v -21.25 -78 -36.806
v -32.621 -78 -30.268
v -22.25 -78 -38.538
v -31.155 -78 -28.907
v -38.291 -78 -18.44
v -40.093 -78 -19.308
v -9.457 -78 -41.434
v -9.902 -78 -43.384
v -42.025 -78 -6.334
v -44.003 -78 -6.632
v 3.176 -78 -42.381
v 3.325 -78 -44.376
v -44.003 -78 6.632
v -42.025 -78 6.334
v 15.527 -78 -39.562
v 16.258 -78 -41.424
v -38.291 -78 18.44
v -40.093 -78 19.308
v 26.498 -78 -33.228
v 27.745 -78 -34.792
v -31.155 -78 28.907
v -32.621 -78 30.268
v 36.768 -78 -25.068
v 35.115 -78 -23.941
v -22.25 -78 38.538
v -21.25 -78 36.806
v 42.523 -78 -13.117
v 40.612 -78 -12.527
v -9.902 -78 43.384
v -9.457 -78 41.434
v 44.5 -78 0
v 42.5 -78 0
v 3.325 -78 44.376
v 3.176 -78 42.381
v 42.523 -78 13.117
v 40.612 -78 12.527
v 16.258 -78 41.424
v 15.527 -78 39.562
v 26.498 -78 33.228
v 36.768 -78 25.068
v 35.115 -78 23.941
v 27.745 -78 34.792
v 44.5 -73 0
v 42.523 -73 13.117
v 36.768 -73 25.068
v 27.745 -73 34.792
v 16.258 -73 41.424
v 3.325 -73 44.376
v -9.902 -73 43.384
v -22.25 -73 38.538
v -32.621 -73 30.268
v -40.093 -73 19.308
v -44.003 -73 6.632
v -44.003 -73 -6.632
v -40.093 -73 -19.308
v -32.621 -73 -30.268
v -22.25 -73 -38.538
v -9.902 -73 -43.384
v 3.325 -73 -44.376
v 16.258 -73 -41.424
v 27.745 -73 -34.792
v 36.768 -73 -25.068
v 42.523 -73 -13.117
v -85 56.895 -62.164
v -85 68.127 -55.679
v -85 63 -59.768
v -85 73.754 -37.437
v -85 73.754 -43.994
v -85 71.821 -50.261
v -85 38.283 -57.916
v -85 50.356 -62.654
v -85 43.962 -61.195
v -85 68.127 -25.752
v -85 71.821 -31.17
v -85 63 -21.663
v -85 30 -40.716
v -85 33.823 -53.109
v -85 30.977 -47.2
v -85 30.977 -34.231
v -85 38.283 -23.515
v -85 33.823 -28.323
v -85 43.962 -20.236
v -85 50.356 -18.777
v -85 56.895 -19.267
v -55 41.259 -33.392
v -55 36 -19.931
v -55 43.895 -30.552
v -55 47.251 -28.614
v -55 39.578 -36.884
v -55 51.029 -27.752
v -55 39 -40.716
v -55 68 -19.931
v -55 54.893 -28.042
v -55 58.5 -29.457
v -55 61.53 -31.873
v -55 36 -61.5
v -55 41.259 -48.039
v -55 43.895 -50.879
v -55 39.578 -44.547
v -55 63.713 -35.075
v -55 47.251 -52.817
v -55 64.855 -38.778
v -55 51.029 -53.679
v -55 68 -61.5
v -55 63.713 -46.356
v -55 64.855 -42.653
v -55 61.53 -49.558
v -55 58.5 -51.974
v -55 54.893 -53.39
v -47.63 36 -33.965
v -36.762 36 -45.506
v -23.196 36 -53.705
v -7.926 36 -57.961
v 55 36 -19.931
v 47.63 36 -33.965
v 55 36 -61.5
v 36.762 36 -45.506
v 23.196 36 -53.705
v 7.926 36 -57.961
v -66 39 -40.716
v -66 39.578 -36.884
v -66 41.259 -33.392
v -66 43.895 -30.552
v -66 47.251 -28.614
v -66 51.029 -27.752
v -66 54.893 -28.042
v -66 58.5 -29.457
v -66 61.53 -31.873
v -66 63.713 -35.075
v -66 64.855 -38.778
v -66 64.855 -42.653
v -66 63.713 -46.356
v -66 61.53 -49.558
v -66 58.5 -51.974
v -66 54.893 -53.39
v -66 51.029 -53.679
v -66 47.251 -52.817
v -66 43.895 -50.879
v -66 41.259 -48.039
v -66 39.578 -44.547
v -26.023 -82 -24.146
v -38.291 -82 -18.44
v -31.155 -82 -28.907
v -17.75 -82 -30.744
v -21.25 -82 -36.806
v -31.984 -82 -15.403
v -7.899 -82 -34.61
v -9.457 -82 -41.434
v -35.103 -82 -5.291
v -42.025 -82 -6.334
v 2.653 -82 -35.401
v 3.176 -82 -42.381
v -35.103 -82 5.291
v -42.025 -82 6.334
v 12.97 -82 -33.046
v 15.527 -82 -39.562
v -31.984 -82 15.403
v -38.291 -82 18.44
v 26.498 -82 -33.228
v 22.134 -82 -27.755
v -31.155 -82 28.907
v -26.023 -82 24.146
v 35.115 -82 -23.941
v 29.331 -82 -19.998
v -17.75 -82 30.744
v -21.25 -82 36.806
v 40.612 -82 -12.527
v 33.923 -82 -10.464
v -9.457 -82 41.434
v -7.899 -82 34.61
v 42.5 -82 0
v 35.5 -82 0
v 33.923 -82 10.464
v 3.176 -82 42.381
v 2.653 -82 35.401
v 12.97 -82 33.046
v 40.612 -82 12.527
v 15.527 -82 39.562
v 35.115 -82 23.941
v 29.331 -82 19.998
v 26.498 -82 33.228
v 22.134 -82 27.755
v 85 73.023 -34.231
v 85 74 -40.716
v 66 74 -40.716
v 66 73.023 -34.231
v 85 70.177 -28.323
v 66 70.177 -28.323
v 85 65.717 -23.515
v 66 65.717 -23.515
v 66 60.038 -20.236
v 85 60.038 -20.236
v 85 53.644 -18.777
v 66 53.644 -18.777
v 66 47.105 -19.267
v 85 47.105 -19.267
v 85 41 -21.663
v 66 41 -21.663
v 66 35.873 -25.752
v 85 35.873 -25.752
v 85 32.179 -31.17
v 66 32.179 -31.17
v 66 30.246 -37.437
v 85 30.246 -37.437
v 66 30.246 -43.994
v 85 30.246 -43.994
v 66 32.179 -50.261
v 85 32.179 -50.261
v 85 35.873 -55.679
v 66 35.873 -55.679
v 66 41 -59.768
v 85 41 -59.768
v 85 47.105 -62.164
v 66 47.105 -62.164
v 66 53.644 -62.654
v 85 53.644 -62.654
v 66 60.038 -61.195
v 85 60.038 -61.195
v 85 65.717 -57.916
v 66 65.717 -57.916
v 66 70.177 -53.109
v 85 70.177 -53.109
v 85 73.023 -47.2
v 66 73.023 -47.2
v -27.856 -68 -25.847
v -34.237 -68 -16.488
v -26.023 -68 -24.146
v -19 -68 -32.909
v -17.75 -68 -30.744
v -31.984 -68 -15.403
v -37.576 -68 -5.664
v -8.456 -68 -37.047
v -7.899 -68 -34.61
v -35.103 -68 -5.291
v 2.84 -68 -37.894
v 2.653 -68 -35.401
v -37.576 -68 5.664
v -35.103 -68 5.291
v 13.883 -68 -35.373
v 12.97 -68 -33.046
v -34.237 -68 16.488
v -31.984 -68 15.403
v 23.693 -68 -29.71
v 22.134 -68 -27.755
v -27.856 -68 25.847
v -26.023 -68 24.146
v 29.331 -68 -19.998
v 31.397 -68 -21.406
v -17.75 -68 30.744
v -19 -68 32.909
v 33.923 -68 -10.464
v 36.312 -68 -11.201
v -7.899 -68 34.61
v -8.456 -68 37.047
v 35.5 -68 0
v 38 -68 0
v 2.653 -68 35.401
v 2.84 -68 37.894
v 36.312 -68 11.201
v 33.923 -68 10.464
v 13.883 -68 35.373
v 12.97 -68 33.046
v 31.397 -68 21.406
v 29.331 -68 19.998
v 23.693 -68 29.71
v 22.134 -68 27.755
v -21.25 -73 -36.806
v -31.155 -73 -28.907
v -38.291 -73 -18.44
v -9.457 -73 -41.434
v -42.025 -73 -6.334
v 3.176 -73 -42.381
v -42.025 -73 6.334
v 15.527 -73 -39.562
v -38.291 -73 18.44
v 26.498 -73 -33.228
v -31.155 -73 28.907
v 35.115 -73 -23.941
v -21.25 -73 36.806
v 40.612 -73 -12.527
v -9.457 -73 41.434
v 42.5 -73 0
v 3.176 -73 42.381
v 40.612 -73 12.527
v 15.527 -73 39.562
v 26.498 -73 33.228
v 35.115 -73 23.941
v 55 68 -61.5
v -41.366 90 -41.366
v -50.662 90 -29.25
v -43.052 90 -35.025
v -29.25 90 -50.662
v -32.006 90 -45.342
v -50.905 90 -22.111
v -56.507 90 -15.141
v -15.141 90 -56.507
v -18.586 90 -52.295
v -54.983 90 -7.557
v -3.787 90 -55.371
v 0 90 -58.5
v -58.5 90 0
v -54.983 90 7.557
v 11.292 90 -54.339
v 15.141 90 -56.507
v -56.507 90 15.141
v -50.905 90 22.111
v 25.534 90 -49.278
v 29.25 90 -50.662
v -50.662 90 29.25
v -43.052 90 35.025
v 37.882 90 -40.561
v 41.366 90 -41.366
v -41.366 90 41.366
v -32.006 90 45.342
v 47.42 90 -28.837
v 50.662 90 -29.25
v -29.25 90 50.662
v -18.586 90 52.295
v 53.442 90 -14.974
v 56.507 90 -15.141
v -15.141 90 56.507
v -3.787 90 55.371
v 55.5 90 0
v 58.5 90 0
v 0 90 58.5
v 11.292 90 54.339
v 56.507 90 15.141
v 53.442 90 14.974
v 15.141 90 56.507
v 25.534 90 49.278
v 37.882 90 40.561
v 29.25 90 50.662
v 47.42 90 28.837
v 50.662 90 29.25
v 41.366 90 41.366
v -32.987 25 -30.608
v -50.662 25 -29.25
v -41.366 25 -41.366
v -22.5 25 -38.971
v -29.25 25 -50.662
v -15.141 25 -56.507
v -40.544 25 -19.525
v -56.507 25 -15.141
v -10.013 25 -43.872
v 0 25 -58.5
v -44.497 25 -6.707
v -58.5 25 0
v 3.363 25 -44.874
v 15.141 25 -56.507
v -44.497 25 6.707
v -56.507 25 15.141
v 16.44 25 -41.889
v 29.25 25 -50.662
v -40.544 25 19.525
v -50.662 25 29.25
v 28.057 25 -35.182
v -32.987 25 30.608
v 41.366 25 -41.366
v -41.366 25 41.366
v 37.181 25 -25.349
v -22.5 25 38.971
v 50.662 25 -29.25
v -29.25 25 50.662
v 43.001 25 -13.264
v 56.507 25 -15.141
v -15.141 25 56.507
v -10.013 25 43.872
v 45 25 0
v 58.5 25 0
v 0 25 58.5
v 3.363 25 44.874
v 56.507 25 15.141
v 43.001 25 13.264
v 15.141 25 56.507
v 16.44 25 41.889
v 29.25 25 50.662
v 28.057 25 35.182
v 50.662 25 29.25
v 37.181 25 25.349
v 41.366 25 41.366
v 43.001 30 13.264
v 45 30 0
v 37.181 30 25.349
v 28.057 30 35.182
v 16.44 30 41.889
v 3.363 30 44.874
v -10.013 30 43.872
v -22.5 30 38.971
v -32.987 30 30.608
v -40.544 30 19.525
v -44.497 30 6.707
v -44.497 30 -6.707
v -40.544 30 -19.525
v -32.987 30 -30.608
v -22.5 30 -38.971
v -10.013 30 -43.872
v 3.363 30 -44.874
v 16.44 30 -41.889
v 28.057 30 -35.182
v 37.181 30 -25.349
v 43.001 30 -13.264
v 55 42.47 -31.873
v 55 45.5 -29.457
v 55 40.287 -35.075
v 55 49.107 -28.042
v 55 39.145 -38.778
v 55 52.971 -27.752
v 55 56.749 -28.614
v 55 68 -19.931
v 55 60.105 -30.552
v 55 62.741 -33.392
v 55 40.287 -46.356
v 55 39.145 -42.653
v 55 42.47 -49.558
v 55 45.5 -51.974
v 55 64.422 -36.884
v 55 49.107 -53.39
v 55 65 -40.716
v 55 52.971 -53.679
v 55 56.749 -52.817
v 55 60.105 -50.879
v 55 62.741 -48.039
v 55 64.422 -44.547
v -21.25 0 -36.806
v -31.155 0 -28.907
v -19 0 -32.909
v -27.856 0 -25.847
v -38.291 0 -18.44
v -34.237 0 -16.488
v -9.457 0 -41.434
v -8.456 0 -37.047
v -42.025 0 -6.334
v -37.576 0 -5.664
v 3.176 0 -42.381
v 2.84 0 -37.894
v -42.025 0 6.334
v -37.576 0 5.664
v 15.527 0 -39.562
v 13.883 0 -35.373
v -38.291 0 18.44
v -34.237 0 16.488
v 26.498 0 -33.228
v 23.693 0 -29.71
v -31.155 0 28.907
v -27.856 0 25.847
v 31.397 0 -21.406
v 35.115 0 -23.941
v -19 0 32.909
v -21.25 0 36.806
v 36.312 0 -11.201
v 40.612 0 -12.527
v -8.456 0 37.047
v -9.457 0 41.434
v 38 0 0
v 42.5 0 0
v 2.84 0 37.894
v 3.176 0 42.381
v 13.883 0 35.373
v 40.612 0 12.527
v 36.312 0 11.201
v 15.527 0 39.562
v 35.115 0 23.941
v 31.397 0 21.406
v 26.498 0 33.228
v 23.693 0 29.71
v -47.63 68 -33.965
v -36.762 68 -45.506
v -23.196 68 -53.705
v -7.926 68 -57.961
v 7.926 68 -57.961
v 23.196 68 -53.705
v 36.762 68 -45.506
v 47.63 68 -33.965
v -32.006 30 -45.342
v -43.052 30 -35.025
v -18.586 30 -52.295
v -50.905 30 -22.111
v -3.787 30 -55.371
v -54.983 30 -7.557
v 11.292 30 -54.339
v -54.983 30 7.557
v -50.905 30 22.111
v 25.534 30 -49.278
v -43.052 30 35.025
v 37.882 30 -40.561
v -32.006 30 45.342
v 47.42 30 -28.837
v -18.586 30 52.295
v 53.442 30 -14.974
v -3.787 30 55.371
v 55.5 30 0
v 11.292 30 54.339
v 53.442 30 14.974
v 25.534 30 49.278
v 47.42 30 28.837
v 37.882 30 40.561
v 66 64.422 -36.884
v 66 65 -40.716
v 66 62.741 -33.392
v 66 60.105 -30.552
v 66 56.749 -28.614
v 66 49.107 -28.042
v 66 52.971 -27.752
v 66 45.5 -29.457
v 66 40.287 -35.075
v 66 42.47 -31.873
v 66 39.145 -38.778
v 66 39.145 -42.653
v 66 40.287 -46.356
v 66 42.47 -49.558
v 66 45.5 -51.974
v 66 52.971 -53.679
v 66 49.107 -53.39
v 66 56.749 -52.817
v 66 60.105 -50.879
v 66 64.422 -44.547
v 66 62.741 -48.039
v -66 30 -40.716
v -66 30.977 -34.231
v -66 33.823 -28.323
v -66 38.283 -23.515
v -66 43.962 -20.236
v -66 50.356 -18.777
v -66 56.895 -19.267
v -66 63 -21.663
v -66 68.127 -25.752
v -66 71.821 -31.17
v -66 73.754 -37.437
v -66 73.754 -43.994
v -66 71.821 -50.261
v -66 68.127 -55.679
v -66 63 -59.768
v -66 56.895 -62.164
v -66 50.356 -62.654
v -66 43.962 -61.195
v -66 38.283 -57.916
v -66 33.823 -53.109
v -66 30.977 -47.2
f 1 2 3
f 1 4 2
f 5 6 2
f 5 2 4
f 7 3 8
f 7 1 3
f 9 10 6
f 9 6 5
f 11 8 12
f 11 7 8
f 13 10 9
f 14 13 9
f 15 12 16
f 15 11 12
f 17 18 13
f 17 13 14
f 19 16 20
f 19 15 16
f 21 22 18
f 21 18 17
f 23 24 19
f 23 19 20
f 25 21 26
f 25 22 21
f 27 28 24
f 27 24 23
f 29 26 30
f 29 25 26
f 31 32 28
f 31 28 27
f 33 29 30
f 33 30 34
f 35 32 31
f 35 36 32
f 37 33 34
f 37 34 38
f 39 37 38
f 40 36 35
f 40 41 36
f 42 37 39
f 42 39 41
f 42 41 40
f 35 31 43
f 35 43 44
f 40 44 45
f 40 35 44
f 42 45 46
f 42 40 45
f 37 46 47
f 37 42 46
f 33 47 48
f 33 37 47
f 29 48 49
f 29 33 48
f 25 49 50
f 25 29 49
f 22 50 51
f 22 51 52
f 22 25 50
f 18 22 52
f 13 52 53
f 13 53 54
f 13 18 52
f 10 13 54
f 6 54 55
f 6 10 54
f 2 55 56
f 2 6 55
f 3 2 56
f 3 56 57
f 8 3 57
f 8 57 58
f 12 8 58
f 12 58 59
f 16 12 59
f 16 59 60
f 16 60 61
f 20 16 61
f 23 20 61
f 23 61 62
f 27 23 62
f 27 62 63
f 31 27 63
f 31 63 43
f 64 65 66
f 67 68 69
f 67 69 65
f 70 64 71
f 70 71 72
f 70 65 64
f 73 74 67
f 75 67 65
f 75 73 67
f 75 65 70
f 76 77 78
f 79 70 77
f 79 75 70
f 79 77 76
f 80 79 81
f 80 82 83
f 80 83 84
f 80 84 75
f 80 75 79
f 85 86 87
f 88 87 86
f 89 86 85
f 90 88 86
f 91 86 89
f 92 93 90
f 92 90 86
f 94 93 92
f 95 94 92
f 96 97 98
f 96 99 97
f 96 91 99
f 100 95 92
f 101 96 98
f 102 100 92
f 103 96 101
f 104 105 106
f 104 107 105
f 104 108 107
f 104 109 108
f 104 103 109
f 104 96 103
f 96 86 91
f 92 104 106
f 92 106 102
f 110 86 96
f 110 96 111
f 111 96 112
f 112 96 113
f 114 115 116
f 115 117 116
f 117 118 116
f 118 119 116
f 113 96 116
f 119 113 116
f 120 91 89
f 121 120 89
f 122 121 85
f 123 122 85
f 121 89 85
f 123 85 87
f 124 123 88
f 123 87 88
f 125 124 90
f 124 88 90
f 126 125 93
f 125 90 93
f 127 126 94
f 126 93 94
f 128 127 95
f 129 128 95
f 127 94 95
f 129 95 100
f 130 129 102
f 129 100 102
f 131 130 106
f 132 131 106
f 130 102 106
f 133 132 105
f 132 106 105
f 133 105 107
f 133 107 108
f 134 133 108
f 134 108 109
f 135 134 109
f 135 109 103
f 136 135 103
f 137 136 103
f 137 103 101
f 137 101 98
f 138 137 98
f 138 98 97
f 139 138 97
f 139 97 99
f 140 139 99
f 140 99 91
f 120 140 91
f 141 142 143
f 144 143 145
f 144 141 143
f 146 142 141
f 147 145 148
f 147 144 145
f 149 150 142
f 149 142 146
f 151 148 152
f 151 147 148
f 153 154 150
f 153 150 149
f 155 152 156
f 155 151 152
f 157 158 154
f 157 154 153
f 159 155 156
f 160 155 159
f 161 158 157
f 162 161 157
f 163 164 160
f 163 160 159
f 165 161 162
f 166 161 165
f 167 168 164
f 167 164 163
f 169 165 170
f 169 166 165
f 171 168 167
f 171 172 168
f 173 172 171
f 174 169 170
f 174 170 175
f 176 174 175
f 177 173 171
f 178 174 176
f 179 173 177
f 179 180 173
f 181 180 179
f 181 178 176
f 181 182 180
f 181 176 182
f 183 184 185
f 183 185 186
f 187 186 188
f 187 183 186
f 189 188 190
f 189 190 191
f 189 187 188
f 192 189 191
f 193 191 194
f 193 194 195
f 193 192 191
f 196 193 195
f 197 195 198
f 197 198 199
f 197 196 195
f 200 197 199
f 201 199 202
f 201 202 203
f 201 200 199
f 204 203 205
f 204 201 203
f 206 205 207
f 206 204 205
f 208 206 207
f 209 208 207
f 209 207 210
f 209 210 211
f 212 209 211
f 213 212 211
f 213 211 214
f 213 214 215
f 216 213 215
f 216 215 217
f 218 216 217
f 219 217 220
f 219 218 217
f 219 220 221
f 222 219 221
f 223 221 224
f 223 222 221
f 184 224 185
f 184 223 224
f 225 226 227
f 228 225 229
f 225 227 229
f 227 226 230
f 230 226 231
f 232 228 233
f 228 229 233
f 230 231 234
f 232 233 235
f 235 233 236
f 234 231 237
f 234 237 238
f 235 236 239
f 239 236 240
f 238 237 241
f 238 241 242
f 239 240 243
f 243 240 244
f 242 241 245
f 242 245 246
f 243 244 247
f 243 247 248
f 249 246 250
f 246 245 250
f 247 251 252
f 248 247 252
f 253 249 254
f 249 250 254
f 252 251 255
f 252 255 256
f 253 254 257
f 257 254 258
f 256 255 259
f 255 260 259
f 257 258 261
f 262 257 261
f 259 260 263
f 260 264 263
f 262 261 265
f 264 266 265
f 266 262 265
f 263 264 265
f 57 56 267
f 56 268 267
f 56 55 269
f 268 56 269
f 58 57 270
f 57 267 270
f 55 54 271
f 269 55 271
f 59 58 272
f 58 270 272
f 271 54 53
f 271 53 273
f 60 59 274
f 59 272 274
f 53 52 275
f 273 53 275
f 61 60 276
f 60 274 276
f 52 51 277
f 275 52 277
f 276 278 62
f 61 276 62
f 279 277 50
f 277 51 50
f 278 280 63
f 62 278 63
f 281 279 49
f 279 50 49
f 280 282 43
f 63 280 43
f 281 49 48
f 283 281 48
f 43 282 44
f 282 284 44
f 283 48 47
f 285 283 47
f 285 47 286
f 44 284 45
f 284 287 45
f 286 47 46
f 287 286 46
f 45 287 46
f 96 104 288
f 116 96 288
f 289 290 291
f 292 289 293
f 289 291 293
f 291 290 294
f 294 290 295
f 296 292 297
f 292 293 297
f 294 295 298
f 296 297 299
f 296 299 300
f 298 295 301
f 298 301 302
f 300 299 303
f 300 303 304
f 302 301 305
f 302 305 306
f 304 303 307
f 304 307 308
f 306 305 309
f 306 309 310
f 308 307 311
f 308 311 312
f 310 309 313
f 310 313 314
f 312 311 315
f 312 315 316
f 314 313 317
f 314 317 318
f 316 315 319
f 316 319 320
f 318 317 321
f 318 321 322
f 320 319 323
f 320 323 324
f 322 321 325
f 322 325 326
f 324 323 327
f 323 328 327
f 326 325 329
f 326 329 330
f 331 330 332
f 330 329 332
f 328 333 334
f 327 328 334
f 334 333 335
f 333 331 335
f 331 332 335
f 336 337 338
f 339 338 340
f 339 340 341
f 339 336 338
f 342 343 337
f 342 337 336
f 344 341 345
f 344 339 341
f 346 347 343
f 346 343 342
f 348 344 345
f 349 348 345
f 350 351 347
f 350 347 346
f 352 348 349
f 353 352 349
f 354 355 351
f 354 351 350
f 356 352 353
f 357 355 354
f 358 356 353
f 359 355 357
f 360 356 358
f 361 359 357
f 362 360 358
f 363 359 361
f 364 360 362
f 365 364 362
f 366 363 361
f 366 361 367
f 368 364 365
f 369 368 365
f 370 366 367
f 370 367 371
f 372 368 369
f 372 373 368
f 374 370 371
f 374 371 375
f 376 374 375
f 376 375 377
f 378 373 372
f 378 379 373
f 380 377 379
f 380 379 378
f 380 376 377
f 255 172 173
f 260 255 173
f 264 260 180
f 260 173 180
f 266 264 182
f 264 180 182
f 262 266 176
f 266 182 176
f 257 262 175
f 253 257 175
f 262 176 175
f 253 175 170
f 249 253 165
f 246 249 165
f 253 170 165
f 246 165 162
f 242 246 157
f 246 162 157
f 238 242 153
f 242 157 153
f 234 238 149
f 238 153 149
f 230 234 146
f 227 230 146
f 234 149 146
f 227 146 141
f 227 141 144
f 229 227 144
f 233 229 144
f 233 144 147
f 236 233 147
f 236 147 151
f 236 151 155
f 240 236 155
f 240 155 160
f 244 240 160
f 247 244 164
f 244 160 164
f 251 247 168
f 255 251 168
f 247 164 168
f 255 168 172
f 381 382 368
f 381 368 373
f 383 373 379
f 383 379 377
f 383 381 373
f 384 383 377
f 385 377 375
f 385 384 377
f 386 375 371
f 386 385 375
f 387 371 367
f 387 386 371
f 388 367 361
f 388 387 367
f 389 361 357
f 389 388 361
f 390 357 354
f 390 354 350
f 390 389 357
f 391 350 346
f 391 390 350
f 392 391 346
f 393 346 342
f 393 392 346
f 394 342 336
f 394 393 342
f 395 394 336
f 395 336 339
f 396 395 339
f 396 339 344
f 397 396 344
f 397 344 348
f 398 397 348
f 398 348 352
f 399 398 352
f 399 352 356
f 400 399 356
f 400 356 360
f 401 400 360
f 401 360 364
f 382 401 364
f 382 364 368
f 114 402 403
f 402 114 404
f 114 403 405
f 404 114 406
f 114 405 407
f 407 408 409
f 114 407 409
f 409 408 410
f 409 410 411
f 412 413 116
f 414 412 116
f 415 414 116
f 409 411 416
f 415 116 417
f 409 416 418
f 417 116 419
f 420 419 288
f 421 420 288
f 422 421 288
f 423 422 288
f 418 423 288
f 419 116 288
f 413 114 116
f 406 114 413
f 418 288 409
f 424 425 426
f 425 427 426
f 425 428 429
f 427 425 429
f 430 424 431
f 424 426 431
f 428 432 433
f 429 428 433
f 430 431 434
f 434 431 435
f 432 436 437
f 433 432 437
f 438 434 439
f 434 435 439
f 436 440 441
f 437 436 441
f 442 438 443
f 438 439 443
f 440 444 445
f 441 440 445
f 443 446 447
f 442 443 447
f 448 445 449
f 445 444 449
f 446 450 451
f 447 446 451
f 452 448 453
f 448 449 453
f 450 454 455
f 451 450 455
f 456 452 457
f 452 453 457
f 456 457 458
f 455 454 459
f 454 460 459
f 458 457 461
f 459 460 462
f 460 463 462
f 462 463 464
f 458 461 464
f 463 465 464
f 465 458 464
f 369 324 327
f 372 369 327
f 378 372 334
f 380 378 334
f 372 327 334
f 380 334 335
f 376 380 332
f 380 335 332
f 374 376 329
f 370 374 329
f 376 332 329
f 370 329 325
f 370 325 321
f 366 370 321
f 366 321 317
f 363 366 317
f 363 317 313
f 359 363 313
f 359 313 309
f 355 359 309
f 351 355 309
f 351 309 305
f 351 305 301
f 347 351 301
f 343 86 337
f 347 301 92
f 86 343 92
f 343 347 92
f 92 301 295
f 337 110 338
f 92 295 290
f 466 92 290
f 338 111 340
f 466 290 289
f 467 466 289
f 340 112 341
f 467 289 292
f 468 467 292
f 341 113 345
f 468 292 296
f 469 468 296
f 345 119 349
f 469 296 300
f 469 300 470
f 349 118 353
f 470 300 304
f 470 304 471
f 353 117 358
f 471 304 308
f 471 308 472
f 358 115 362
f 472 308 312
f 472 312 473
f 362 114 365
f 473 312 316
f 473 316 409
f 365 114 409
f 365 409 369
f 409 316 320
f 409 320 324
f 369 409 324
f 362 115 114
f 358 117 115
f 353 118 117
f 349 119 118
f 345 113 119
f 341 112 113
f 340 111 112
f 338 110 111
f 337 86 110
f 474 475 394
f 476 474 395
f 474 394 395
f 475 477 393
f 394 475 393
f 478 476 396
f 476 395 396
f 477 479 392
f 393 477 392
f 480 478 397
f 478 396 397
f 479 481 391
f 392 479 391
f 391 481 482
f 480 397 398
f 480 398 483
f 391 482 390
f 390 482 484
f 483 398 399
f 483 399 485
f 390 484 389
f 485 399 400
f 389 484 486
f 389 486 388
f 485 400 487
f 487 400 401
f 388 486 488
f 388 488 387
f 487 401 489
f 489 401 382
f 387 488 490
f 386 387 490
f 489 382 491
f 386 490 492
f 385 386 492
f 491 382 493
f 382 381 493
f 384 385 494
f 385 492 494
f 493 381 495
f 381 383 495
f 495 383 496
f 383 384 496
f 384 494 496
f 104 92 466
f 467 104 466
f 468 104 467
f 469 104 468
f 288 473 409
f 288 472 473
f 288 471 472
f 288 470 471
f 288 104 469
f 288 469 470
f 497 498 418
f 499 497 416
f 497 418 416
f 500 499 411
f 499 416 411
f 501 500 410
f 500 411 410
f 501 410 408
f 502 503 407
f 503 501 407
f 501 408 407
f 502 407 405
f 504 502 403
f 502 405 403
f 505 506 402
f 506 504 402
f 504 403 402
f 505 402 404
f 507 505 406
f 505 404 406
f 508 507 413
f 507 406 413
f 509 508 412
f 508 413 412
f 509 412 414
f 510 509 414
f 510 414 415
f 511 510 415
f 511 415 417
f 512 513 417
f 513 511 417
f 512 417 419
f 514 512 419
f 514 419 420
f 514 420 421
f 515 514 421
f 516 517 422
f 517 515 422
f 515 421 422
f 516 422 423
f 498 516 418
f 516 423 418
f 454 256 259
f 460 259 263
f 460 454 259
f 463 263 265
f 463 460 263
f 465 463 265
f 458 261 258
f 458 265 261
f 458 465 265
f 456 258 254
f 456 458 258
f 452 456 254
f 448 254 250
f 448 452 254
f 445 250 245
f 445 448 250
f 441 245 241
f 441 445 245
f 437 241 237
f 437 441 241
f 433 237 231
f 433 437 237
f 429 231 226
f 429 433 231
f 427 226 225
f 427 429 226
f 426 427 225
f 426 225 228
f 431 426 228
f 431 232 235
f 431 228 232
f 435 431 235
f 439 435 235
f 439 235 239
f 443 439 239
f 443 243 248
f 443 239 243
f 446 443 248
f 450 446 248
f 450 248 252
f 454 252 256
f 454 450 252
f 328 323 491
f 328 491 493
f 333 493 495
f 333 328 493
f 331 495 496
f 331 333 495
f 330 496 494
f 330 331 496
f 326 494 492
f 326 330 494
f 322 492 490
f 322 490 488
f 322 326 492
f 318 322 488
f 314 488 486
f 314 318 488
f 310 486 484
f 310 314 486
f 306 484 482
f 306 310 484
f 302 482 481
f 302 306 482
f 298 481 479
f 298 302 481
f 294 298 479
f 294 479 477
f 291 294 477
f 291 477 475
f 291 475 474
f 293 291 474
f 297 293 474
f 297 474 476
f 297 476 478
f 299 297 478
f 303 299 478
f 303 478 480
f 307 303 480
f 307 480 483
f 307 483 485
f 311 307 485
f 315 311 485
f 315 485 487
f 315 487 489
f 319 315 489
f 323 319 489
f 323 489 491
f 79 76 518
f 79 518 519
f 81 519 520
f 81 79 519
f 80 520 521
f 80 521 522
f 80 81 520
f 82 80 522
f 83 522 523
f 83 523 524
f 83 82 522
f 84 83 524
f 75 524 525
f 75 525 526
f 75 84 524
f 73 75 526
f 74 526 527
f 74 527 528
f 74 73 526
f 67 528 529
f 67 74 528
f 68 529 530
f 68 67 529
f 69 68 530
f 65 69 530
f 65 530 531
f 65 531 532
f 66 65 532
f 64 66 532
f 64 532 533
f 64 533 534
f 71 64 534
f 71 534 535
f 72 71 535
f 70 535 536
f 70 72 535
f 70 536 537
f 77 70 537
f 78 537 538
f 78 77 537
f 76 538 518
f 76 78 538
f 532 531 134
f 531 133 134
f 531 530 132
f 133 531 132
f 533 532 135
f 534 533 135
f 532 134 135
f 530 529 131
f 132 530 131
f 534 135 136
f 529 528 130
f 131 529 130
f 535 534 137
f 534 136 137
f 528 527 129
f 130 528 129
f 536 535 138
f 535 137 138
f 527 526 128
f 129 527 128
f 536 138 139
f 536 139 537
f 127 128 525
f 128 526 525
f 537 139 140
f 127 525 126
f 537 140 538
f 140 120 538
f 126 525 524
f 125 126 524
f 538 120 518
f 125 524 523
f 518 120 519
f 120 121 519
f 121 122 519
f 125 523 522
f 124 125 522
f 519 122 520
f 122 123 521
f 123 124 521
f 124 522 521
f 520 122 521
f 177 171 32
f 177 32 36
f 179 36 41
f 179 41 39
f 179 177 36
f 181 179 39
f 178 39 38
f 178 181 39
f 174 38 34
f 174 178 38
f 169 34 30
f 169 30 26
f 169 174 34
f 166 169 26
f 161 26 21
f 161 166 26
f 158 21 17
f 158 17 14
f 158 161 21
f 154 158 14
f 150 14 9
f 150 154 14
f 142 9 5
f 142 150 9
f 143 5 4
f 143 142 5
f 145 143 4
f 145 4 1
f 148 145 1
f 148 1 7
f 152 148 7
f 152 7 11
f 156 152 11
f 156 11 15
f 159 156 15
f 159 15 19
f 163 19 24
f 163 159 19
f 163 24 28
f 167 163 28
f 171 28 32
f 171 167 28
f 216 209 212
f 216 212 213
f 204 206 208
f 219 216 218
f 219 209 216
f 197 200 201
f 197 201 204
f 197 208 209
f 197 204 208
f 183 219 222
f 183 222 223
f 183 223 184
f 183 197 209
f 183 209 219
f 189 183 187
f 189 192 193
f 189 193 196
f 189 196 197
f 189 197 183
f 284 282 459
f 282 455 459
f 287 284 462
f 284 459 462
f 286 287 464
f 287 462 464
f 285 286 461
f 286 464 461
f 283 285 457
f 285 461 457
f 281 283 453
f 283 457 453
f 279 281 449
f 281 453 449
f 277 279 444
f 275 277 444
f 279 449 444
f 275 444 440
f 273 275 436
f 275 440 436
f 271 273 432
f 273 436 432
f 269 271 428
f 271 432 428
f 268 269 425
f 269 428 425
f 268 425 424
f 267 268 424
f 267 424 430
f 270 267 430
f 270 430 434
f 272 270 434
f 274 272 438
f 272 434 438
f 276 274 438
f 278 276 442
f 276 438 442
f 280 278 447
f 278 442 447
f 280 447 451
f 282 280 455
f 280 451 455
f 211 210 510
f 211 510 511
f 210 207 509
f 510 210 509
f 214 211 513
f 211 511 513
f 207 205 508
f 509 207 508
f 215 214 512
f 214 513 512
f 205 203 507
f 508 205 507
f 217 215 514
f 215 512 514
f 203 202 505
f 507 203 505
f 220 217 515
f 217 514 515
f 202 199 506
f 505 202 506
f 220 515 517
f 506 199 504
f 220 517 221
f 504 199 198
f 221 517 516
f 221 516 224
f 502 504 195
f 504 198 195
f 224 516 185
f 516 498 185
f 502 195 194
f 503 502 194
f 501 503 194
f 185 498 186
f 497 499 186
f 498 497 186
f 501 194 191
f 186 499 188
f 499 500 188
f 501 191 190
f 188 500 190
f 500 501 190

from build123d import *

# Parameters (mm, degrees)
F3_R      = 42.5
F3_R_2    = 38
F4_DEPTH  = 82
F5_R      = 42.5
F5_R_2    = 38
F5_R_3    = 35.5
F6_DEPTH  = 14
F7_DEPTH  = 14
F5_R_4    = 44.5
F8_DEPTH  = 9
F9_DEPTH  = 4
F13_R     = 58.5
F13_R_2   = 55.5
F13_R_3   = 45
F14_DEPTH = 65
F15_DEPTH = 60
F17_W     = 110
F17_H     = 32
F18_DEPTH = 44.8
F19_R     = 55.5
F20_DEPTH = 35
F21_R     = 13
F22_DEPTH = 30
F23_R     = 22
F23_R_2   = 13
F24_DEPTH = 19
F25_R     = 13
F26_DEPTH = 30
F27_R     = 22
F27_R_2   = 13
F28_DEPTH = 19


with BuildPart() as f4:
    # F3 (on Front) → F4 (new body)
    with BuildSketch(Plane.XZ):
        Circle(F3_R)
        Circle(F3_R_2, mode=Mode.SUBTRACT)
    extrude(amount=F4_DEPTH)

    # F5 (on face) → F6 (join)
    with BuildSketch(Plane.XZ.offset(82)):
        Circle(F5_R)
        Circle(F5_R_2, mode=Mode.SUBTRACT)
        Circle(F5_R_2)
        Circle(F5_R_3, mode=Mode.SUBTRACT)
    extrude(amount=-F6_DEPTH)

    # F5 (on face) → F7 (join)
    with BuildSketch(Plane.XZ.offset(82)):
        Circle(F5_R_2)
        Circle(F5_R_3, mode=Mode.SUBTRACT)
    extrude(amount=-F7_DEPTH)

    # F5 (on face) → F8 (join)
    with BuildSketch(Plane.XZ.offset(82)):
        Circle(F5_R_4)
        Circle(F5_R, mode=Mode.SUBTRACT)
    extrude(amount=-F8_DEPTH)

    # F5 (on face) → F9 (cut)
    with BuildSketch(Plane.XZ.offset(82)):
        Circle(F5_R_4)
        Circle(F5_R, mode=Mode.SUBTRACT)
    extrude(amount=-F9_DEPTH, mode=Mode.SUBTRACT)


with BuildPart() as f14:
    # F13 (on offset) → F14 (new body)
    with BuildSketch(Plane.XZ.offset(-90)):
        Circle(F13_R)
        Circle(F13_R_2, mode=Mode.SUBTRACT)
        Circle(F13_R_2)
        Circle(F13_R_3, mode=Mode.SUBTRACT)
    extrude(amount=F14_DEPTH)

    # F13 (on offset) → F15 (cut)
    with BuildSketch(Plane.XZ.offset(-90)):
        Circle(F13_R_2)
        Circle(F13_R_3, mode=Mode.SUBTRACT)
    extrude(amount=F15_DEPTH, mode=Mode.SUBTRACT)

    # F17 (on offset) → F18 (join)
    with BuildSketch(Plane.XY.offset(-61.5)):
        with Locations((0, 52)):
            Rectangle(F17_W, F17_H)
    extrude(amount=F18_DEPTH)

    # F19 (on face) → F20 (cut)
    with BuildSketch(Plane(origin=(0, 68, 0), x_dir=(-1, 0, 0), z_dir=(0, 1, 0))):
        Circle(F19_R)
    extrude(amount=-F20_DEPTH, mode=Mode.SUBTRACT)

    # F21 (on face) → F22 (join)
    with BuildSketch(Plane(origin=(-55, 0, 0), x_dir=(0, -1, 0), z_dir=(-1, 0, 0))):
        with Locations((-52, -40.715565714)):
            Circle(F21_R)
    extrude(amount=F22_DEPTH)

    # F23 (on face) → F24 (join)
    with BuildSketch(Plane(origin=(-85, 0, 0), x_dir=(0, -1, 0), z_dir=(-1, 0, 0))):
        with Locations((-52, -40.715565714)):
            Circle(F23_R)
        with Locations((-52, -40.715565714)):
            Circle(F23_R_2, mode=Mode.SUBTRACT)
    extrude(amount=-F24_DEPTH)

    # F25 (on face) → F26 (join)
    with BuildSketch(Plane.YZ.offset(55)):
        with Locations((52, -40.715565714)):
            Circle(F25_R)
    extrude(amount=F26_DEPTH)

    # F27 (on face) → F28 (join)
    with BuildSketch(Plane.YZ.offset(85)):
        with Locations((52, -40.715565714)):
            Circle(F27_R)
        with Locations((52, -40.715565714)):
            Circle(F27_R_2, mode=Mode.SUBTRACT)
        with Locations((52, -40.715565714)):
            Circle(F27_R_2)
    extrude(amount=-F28_DEPTH)


solid = Compound([f4.part, f14.part])
